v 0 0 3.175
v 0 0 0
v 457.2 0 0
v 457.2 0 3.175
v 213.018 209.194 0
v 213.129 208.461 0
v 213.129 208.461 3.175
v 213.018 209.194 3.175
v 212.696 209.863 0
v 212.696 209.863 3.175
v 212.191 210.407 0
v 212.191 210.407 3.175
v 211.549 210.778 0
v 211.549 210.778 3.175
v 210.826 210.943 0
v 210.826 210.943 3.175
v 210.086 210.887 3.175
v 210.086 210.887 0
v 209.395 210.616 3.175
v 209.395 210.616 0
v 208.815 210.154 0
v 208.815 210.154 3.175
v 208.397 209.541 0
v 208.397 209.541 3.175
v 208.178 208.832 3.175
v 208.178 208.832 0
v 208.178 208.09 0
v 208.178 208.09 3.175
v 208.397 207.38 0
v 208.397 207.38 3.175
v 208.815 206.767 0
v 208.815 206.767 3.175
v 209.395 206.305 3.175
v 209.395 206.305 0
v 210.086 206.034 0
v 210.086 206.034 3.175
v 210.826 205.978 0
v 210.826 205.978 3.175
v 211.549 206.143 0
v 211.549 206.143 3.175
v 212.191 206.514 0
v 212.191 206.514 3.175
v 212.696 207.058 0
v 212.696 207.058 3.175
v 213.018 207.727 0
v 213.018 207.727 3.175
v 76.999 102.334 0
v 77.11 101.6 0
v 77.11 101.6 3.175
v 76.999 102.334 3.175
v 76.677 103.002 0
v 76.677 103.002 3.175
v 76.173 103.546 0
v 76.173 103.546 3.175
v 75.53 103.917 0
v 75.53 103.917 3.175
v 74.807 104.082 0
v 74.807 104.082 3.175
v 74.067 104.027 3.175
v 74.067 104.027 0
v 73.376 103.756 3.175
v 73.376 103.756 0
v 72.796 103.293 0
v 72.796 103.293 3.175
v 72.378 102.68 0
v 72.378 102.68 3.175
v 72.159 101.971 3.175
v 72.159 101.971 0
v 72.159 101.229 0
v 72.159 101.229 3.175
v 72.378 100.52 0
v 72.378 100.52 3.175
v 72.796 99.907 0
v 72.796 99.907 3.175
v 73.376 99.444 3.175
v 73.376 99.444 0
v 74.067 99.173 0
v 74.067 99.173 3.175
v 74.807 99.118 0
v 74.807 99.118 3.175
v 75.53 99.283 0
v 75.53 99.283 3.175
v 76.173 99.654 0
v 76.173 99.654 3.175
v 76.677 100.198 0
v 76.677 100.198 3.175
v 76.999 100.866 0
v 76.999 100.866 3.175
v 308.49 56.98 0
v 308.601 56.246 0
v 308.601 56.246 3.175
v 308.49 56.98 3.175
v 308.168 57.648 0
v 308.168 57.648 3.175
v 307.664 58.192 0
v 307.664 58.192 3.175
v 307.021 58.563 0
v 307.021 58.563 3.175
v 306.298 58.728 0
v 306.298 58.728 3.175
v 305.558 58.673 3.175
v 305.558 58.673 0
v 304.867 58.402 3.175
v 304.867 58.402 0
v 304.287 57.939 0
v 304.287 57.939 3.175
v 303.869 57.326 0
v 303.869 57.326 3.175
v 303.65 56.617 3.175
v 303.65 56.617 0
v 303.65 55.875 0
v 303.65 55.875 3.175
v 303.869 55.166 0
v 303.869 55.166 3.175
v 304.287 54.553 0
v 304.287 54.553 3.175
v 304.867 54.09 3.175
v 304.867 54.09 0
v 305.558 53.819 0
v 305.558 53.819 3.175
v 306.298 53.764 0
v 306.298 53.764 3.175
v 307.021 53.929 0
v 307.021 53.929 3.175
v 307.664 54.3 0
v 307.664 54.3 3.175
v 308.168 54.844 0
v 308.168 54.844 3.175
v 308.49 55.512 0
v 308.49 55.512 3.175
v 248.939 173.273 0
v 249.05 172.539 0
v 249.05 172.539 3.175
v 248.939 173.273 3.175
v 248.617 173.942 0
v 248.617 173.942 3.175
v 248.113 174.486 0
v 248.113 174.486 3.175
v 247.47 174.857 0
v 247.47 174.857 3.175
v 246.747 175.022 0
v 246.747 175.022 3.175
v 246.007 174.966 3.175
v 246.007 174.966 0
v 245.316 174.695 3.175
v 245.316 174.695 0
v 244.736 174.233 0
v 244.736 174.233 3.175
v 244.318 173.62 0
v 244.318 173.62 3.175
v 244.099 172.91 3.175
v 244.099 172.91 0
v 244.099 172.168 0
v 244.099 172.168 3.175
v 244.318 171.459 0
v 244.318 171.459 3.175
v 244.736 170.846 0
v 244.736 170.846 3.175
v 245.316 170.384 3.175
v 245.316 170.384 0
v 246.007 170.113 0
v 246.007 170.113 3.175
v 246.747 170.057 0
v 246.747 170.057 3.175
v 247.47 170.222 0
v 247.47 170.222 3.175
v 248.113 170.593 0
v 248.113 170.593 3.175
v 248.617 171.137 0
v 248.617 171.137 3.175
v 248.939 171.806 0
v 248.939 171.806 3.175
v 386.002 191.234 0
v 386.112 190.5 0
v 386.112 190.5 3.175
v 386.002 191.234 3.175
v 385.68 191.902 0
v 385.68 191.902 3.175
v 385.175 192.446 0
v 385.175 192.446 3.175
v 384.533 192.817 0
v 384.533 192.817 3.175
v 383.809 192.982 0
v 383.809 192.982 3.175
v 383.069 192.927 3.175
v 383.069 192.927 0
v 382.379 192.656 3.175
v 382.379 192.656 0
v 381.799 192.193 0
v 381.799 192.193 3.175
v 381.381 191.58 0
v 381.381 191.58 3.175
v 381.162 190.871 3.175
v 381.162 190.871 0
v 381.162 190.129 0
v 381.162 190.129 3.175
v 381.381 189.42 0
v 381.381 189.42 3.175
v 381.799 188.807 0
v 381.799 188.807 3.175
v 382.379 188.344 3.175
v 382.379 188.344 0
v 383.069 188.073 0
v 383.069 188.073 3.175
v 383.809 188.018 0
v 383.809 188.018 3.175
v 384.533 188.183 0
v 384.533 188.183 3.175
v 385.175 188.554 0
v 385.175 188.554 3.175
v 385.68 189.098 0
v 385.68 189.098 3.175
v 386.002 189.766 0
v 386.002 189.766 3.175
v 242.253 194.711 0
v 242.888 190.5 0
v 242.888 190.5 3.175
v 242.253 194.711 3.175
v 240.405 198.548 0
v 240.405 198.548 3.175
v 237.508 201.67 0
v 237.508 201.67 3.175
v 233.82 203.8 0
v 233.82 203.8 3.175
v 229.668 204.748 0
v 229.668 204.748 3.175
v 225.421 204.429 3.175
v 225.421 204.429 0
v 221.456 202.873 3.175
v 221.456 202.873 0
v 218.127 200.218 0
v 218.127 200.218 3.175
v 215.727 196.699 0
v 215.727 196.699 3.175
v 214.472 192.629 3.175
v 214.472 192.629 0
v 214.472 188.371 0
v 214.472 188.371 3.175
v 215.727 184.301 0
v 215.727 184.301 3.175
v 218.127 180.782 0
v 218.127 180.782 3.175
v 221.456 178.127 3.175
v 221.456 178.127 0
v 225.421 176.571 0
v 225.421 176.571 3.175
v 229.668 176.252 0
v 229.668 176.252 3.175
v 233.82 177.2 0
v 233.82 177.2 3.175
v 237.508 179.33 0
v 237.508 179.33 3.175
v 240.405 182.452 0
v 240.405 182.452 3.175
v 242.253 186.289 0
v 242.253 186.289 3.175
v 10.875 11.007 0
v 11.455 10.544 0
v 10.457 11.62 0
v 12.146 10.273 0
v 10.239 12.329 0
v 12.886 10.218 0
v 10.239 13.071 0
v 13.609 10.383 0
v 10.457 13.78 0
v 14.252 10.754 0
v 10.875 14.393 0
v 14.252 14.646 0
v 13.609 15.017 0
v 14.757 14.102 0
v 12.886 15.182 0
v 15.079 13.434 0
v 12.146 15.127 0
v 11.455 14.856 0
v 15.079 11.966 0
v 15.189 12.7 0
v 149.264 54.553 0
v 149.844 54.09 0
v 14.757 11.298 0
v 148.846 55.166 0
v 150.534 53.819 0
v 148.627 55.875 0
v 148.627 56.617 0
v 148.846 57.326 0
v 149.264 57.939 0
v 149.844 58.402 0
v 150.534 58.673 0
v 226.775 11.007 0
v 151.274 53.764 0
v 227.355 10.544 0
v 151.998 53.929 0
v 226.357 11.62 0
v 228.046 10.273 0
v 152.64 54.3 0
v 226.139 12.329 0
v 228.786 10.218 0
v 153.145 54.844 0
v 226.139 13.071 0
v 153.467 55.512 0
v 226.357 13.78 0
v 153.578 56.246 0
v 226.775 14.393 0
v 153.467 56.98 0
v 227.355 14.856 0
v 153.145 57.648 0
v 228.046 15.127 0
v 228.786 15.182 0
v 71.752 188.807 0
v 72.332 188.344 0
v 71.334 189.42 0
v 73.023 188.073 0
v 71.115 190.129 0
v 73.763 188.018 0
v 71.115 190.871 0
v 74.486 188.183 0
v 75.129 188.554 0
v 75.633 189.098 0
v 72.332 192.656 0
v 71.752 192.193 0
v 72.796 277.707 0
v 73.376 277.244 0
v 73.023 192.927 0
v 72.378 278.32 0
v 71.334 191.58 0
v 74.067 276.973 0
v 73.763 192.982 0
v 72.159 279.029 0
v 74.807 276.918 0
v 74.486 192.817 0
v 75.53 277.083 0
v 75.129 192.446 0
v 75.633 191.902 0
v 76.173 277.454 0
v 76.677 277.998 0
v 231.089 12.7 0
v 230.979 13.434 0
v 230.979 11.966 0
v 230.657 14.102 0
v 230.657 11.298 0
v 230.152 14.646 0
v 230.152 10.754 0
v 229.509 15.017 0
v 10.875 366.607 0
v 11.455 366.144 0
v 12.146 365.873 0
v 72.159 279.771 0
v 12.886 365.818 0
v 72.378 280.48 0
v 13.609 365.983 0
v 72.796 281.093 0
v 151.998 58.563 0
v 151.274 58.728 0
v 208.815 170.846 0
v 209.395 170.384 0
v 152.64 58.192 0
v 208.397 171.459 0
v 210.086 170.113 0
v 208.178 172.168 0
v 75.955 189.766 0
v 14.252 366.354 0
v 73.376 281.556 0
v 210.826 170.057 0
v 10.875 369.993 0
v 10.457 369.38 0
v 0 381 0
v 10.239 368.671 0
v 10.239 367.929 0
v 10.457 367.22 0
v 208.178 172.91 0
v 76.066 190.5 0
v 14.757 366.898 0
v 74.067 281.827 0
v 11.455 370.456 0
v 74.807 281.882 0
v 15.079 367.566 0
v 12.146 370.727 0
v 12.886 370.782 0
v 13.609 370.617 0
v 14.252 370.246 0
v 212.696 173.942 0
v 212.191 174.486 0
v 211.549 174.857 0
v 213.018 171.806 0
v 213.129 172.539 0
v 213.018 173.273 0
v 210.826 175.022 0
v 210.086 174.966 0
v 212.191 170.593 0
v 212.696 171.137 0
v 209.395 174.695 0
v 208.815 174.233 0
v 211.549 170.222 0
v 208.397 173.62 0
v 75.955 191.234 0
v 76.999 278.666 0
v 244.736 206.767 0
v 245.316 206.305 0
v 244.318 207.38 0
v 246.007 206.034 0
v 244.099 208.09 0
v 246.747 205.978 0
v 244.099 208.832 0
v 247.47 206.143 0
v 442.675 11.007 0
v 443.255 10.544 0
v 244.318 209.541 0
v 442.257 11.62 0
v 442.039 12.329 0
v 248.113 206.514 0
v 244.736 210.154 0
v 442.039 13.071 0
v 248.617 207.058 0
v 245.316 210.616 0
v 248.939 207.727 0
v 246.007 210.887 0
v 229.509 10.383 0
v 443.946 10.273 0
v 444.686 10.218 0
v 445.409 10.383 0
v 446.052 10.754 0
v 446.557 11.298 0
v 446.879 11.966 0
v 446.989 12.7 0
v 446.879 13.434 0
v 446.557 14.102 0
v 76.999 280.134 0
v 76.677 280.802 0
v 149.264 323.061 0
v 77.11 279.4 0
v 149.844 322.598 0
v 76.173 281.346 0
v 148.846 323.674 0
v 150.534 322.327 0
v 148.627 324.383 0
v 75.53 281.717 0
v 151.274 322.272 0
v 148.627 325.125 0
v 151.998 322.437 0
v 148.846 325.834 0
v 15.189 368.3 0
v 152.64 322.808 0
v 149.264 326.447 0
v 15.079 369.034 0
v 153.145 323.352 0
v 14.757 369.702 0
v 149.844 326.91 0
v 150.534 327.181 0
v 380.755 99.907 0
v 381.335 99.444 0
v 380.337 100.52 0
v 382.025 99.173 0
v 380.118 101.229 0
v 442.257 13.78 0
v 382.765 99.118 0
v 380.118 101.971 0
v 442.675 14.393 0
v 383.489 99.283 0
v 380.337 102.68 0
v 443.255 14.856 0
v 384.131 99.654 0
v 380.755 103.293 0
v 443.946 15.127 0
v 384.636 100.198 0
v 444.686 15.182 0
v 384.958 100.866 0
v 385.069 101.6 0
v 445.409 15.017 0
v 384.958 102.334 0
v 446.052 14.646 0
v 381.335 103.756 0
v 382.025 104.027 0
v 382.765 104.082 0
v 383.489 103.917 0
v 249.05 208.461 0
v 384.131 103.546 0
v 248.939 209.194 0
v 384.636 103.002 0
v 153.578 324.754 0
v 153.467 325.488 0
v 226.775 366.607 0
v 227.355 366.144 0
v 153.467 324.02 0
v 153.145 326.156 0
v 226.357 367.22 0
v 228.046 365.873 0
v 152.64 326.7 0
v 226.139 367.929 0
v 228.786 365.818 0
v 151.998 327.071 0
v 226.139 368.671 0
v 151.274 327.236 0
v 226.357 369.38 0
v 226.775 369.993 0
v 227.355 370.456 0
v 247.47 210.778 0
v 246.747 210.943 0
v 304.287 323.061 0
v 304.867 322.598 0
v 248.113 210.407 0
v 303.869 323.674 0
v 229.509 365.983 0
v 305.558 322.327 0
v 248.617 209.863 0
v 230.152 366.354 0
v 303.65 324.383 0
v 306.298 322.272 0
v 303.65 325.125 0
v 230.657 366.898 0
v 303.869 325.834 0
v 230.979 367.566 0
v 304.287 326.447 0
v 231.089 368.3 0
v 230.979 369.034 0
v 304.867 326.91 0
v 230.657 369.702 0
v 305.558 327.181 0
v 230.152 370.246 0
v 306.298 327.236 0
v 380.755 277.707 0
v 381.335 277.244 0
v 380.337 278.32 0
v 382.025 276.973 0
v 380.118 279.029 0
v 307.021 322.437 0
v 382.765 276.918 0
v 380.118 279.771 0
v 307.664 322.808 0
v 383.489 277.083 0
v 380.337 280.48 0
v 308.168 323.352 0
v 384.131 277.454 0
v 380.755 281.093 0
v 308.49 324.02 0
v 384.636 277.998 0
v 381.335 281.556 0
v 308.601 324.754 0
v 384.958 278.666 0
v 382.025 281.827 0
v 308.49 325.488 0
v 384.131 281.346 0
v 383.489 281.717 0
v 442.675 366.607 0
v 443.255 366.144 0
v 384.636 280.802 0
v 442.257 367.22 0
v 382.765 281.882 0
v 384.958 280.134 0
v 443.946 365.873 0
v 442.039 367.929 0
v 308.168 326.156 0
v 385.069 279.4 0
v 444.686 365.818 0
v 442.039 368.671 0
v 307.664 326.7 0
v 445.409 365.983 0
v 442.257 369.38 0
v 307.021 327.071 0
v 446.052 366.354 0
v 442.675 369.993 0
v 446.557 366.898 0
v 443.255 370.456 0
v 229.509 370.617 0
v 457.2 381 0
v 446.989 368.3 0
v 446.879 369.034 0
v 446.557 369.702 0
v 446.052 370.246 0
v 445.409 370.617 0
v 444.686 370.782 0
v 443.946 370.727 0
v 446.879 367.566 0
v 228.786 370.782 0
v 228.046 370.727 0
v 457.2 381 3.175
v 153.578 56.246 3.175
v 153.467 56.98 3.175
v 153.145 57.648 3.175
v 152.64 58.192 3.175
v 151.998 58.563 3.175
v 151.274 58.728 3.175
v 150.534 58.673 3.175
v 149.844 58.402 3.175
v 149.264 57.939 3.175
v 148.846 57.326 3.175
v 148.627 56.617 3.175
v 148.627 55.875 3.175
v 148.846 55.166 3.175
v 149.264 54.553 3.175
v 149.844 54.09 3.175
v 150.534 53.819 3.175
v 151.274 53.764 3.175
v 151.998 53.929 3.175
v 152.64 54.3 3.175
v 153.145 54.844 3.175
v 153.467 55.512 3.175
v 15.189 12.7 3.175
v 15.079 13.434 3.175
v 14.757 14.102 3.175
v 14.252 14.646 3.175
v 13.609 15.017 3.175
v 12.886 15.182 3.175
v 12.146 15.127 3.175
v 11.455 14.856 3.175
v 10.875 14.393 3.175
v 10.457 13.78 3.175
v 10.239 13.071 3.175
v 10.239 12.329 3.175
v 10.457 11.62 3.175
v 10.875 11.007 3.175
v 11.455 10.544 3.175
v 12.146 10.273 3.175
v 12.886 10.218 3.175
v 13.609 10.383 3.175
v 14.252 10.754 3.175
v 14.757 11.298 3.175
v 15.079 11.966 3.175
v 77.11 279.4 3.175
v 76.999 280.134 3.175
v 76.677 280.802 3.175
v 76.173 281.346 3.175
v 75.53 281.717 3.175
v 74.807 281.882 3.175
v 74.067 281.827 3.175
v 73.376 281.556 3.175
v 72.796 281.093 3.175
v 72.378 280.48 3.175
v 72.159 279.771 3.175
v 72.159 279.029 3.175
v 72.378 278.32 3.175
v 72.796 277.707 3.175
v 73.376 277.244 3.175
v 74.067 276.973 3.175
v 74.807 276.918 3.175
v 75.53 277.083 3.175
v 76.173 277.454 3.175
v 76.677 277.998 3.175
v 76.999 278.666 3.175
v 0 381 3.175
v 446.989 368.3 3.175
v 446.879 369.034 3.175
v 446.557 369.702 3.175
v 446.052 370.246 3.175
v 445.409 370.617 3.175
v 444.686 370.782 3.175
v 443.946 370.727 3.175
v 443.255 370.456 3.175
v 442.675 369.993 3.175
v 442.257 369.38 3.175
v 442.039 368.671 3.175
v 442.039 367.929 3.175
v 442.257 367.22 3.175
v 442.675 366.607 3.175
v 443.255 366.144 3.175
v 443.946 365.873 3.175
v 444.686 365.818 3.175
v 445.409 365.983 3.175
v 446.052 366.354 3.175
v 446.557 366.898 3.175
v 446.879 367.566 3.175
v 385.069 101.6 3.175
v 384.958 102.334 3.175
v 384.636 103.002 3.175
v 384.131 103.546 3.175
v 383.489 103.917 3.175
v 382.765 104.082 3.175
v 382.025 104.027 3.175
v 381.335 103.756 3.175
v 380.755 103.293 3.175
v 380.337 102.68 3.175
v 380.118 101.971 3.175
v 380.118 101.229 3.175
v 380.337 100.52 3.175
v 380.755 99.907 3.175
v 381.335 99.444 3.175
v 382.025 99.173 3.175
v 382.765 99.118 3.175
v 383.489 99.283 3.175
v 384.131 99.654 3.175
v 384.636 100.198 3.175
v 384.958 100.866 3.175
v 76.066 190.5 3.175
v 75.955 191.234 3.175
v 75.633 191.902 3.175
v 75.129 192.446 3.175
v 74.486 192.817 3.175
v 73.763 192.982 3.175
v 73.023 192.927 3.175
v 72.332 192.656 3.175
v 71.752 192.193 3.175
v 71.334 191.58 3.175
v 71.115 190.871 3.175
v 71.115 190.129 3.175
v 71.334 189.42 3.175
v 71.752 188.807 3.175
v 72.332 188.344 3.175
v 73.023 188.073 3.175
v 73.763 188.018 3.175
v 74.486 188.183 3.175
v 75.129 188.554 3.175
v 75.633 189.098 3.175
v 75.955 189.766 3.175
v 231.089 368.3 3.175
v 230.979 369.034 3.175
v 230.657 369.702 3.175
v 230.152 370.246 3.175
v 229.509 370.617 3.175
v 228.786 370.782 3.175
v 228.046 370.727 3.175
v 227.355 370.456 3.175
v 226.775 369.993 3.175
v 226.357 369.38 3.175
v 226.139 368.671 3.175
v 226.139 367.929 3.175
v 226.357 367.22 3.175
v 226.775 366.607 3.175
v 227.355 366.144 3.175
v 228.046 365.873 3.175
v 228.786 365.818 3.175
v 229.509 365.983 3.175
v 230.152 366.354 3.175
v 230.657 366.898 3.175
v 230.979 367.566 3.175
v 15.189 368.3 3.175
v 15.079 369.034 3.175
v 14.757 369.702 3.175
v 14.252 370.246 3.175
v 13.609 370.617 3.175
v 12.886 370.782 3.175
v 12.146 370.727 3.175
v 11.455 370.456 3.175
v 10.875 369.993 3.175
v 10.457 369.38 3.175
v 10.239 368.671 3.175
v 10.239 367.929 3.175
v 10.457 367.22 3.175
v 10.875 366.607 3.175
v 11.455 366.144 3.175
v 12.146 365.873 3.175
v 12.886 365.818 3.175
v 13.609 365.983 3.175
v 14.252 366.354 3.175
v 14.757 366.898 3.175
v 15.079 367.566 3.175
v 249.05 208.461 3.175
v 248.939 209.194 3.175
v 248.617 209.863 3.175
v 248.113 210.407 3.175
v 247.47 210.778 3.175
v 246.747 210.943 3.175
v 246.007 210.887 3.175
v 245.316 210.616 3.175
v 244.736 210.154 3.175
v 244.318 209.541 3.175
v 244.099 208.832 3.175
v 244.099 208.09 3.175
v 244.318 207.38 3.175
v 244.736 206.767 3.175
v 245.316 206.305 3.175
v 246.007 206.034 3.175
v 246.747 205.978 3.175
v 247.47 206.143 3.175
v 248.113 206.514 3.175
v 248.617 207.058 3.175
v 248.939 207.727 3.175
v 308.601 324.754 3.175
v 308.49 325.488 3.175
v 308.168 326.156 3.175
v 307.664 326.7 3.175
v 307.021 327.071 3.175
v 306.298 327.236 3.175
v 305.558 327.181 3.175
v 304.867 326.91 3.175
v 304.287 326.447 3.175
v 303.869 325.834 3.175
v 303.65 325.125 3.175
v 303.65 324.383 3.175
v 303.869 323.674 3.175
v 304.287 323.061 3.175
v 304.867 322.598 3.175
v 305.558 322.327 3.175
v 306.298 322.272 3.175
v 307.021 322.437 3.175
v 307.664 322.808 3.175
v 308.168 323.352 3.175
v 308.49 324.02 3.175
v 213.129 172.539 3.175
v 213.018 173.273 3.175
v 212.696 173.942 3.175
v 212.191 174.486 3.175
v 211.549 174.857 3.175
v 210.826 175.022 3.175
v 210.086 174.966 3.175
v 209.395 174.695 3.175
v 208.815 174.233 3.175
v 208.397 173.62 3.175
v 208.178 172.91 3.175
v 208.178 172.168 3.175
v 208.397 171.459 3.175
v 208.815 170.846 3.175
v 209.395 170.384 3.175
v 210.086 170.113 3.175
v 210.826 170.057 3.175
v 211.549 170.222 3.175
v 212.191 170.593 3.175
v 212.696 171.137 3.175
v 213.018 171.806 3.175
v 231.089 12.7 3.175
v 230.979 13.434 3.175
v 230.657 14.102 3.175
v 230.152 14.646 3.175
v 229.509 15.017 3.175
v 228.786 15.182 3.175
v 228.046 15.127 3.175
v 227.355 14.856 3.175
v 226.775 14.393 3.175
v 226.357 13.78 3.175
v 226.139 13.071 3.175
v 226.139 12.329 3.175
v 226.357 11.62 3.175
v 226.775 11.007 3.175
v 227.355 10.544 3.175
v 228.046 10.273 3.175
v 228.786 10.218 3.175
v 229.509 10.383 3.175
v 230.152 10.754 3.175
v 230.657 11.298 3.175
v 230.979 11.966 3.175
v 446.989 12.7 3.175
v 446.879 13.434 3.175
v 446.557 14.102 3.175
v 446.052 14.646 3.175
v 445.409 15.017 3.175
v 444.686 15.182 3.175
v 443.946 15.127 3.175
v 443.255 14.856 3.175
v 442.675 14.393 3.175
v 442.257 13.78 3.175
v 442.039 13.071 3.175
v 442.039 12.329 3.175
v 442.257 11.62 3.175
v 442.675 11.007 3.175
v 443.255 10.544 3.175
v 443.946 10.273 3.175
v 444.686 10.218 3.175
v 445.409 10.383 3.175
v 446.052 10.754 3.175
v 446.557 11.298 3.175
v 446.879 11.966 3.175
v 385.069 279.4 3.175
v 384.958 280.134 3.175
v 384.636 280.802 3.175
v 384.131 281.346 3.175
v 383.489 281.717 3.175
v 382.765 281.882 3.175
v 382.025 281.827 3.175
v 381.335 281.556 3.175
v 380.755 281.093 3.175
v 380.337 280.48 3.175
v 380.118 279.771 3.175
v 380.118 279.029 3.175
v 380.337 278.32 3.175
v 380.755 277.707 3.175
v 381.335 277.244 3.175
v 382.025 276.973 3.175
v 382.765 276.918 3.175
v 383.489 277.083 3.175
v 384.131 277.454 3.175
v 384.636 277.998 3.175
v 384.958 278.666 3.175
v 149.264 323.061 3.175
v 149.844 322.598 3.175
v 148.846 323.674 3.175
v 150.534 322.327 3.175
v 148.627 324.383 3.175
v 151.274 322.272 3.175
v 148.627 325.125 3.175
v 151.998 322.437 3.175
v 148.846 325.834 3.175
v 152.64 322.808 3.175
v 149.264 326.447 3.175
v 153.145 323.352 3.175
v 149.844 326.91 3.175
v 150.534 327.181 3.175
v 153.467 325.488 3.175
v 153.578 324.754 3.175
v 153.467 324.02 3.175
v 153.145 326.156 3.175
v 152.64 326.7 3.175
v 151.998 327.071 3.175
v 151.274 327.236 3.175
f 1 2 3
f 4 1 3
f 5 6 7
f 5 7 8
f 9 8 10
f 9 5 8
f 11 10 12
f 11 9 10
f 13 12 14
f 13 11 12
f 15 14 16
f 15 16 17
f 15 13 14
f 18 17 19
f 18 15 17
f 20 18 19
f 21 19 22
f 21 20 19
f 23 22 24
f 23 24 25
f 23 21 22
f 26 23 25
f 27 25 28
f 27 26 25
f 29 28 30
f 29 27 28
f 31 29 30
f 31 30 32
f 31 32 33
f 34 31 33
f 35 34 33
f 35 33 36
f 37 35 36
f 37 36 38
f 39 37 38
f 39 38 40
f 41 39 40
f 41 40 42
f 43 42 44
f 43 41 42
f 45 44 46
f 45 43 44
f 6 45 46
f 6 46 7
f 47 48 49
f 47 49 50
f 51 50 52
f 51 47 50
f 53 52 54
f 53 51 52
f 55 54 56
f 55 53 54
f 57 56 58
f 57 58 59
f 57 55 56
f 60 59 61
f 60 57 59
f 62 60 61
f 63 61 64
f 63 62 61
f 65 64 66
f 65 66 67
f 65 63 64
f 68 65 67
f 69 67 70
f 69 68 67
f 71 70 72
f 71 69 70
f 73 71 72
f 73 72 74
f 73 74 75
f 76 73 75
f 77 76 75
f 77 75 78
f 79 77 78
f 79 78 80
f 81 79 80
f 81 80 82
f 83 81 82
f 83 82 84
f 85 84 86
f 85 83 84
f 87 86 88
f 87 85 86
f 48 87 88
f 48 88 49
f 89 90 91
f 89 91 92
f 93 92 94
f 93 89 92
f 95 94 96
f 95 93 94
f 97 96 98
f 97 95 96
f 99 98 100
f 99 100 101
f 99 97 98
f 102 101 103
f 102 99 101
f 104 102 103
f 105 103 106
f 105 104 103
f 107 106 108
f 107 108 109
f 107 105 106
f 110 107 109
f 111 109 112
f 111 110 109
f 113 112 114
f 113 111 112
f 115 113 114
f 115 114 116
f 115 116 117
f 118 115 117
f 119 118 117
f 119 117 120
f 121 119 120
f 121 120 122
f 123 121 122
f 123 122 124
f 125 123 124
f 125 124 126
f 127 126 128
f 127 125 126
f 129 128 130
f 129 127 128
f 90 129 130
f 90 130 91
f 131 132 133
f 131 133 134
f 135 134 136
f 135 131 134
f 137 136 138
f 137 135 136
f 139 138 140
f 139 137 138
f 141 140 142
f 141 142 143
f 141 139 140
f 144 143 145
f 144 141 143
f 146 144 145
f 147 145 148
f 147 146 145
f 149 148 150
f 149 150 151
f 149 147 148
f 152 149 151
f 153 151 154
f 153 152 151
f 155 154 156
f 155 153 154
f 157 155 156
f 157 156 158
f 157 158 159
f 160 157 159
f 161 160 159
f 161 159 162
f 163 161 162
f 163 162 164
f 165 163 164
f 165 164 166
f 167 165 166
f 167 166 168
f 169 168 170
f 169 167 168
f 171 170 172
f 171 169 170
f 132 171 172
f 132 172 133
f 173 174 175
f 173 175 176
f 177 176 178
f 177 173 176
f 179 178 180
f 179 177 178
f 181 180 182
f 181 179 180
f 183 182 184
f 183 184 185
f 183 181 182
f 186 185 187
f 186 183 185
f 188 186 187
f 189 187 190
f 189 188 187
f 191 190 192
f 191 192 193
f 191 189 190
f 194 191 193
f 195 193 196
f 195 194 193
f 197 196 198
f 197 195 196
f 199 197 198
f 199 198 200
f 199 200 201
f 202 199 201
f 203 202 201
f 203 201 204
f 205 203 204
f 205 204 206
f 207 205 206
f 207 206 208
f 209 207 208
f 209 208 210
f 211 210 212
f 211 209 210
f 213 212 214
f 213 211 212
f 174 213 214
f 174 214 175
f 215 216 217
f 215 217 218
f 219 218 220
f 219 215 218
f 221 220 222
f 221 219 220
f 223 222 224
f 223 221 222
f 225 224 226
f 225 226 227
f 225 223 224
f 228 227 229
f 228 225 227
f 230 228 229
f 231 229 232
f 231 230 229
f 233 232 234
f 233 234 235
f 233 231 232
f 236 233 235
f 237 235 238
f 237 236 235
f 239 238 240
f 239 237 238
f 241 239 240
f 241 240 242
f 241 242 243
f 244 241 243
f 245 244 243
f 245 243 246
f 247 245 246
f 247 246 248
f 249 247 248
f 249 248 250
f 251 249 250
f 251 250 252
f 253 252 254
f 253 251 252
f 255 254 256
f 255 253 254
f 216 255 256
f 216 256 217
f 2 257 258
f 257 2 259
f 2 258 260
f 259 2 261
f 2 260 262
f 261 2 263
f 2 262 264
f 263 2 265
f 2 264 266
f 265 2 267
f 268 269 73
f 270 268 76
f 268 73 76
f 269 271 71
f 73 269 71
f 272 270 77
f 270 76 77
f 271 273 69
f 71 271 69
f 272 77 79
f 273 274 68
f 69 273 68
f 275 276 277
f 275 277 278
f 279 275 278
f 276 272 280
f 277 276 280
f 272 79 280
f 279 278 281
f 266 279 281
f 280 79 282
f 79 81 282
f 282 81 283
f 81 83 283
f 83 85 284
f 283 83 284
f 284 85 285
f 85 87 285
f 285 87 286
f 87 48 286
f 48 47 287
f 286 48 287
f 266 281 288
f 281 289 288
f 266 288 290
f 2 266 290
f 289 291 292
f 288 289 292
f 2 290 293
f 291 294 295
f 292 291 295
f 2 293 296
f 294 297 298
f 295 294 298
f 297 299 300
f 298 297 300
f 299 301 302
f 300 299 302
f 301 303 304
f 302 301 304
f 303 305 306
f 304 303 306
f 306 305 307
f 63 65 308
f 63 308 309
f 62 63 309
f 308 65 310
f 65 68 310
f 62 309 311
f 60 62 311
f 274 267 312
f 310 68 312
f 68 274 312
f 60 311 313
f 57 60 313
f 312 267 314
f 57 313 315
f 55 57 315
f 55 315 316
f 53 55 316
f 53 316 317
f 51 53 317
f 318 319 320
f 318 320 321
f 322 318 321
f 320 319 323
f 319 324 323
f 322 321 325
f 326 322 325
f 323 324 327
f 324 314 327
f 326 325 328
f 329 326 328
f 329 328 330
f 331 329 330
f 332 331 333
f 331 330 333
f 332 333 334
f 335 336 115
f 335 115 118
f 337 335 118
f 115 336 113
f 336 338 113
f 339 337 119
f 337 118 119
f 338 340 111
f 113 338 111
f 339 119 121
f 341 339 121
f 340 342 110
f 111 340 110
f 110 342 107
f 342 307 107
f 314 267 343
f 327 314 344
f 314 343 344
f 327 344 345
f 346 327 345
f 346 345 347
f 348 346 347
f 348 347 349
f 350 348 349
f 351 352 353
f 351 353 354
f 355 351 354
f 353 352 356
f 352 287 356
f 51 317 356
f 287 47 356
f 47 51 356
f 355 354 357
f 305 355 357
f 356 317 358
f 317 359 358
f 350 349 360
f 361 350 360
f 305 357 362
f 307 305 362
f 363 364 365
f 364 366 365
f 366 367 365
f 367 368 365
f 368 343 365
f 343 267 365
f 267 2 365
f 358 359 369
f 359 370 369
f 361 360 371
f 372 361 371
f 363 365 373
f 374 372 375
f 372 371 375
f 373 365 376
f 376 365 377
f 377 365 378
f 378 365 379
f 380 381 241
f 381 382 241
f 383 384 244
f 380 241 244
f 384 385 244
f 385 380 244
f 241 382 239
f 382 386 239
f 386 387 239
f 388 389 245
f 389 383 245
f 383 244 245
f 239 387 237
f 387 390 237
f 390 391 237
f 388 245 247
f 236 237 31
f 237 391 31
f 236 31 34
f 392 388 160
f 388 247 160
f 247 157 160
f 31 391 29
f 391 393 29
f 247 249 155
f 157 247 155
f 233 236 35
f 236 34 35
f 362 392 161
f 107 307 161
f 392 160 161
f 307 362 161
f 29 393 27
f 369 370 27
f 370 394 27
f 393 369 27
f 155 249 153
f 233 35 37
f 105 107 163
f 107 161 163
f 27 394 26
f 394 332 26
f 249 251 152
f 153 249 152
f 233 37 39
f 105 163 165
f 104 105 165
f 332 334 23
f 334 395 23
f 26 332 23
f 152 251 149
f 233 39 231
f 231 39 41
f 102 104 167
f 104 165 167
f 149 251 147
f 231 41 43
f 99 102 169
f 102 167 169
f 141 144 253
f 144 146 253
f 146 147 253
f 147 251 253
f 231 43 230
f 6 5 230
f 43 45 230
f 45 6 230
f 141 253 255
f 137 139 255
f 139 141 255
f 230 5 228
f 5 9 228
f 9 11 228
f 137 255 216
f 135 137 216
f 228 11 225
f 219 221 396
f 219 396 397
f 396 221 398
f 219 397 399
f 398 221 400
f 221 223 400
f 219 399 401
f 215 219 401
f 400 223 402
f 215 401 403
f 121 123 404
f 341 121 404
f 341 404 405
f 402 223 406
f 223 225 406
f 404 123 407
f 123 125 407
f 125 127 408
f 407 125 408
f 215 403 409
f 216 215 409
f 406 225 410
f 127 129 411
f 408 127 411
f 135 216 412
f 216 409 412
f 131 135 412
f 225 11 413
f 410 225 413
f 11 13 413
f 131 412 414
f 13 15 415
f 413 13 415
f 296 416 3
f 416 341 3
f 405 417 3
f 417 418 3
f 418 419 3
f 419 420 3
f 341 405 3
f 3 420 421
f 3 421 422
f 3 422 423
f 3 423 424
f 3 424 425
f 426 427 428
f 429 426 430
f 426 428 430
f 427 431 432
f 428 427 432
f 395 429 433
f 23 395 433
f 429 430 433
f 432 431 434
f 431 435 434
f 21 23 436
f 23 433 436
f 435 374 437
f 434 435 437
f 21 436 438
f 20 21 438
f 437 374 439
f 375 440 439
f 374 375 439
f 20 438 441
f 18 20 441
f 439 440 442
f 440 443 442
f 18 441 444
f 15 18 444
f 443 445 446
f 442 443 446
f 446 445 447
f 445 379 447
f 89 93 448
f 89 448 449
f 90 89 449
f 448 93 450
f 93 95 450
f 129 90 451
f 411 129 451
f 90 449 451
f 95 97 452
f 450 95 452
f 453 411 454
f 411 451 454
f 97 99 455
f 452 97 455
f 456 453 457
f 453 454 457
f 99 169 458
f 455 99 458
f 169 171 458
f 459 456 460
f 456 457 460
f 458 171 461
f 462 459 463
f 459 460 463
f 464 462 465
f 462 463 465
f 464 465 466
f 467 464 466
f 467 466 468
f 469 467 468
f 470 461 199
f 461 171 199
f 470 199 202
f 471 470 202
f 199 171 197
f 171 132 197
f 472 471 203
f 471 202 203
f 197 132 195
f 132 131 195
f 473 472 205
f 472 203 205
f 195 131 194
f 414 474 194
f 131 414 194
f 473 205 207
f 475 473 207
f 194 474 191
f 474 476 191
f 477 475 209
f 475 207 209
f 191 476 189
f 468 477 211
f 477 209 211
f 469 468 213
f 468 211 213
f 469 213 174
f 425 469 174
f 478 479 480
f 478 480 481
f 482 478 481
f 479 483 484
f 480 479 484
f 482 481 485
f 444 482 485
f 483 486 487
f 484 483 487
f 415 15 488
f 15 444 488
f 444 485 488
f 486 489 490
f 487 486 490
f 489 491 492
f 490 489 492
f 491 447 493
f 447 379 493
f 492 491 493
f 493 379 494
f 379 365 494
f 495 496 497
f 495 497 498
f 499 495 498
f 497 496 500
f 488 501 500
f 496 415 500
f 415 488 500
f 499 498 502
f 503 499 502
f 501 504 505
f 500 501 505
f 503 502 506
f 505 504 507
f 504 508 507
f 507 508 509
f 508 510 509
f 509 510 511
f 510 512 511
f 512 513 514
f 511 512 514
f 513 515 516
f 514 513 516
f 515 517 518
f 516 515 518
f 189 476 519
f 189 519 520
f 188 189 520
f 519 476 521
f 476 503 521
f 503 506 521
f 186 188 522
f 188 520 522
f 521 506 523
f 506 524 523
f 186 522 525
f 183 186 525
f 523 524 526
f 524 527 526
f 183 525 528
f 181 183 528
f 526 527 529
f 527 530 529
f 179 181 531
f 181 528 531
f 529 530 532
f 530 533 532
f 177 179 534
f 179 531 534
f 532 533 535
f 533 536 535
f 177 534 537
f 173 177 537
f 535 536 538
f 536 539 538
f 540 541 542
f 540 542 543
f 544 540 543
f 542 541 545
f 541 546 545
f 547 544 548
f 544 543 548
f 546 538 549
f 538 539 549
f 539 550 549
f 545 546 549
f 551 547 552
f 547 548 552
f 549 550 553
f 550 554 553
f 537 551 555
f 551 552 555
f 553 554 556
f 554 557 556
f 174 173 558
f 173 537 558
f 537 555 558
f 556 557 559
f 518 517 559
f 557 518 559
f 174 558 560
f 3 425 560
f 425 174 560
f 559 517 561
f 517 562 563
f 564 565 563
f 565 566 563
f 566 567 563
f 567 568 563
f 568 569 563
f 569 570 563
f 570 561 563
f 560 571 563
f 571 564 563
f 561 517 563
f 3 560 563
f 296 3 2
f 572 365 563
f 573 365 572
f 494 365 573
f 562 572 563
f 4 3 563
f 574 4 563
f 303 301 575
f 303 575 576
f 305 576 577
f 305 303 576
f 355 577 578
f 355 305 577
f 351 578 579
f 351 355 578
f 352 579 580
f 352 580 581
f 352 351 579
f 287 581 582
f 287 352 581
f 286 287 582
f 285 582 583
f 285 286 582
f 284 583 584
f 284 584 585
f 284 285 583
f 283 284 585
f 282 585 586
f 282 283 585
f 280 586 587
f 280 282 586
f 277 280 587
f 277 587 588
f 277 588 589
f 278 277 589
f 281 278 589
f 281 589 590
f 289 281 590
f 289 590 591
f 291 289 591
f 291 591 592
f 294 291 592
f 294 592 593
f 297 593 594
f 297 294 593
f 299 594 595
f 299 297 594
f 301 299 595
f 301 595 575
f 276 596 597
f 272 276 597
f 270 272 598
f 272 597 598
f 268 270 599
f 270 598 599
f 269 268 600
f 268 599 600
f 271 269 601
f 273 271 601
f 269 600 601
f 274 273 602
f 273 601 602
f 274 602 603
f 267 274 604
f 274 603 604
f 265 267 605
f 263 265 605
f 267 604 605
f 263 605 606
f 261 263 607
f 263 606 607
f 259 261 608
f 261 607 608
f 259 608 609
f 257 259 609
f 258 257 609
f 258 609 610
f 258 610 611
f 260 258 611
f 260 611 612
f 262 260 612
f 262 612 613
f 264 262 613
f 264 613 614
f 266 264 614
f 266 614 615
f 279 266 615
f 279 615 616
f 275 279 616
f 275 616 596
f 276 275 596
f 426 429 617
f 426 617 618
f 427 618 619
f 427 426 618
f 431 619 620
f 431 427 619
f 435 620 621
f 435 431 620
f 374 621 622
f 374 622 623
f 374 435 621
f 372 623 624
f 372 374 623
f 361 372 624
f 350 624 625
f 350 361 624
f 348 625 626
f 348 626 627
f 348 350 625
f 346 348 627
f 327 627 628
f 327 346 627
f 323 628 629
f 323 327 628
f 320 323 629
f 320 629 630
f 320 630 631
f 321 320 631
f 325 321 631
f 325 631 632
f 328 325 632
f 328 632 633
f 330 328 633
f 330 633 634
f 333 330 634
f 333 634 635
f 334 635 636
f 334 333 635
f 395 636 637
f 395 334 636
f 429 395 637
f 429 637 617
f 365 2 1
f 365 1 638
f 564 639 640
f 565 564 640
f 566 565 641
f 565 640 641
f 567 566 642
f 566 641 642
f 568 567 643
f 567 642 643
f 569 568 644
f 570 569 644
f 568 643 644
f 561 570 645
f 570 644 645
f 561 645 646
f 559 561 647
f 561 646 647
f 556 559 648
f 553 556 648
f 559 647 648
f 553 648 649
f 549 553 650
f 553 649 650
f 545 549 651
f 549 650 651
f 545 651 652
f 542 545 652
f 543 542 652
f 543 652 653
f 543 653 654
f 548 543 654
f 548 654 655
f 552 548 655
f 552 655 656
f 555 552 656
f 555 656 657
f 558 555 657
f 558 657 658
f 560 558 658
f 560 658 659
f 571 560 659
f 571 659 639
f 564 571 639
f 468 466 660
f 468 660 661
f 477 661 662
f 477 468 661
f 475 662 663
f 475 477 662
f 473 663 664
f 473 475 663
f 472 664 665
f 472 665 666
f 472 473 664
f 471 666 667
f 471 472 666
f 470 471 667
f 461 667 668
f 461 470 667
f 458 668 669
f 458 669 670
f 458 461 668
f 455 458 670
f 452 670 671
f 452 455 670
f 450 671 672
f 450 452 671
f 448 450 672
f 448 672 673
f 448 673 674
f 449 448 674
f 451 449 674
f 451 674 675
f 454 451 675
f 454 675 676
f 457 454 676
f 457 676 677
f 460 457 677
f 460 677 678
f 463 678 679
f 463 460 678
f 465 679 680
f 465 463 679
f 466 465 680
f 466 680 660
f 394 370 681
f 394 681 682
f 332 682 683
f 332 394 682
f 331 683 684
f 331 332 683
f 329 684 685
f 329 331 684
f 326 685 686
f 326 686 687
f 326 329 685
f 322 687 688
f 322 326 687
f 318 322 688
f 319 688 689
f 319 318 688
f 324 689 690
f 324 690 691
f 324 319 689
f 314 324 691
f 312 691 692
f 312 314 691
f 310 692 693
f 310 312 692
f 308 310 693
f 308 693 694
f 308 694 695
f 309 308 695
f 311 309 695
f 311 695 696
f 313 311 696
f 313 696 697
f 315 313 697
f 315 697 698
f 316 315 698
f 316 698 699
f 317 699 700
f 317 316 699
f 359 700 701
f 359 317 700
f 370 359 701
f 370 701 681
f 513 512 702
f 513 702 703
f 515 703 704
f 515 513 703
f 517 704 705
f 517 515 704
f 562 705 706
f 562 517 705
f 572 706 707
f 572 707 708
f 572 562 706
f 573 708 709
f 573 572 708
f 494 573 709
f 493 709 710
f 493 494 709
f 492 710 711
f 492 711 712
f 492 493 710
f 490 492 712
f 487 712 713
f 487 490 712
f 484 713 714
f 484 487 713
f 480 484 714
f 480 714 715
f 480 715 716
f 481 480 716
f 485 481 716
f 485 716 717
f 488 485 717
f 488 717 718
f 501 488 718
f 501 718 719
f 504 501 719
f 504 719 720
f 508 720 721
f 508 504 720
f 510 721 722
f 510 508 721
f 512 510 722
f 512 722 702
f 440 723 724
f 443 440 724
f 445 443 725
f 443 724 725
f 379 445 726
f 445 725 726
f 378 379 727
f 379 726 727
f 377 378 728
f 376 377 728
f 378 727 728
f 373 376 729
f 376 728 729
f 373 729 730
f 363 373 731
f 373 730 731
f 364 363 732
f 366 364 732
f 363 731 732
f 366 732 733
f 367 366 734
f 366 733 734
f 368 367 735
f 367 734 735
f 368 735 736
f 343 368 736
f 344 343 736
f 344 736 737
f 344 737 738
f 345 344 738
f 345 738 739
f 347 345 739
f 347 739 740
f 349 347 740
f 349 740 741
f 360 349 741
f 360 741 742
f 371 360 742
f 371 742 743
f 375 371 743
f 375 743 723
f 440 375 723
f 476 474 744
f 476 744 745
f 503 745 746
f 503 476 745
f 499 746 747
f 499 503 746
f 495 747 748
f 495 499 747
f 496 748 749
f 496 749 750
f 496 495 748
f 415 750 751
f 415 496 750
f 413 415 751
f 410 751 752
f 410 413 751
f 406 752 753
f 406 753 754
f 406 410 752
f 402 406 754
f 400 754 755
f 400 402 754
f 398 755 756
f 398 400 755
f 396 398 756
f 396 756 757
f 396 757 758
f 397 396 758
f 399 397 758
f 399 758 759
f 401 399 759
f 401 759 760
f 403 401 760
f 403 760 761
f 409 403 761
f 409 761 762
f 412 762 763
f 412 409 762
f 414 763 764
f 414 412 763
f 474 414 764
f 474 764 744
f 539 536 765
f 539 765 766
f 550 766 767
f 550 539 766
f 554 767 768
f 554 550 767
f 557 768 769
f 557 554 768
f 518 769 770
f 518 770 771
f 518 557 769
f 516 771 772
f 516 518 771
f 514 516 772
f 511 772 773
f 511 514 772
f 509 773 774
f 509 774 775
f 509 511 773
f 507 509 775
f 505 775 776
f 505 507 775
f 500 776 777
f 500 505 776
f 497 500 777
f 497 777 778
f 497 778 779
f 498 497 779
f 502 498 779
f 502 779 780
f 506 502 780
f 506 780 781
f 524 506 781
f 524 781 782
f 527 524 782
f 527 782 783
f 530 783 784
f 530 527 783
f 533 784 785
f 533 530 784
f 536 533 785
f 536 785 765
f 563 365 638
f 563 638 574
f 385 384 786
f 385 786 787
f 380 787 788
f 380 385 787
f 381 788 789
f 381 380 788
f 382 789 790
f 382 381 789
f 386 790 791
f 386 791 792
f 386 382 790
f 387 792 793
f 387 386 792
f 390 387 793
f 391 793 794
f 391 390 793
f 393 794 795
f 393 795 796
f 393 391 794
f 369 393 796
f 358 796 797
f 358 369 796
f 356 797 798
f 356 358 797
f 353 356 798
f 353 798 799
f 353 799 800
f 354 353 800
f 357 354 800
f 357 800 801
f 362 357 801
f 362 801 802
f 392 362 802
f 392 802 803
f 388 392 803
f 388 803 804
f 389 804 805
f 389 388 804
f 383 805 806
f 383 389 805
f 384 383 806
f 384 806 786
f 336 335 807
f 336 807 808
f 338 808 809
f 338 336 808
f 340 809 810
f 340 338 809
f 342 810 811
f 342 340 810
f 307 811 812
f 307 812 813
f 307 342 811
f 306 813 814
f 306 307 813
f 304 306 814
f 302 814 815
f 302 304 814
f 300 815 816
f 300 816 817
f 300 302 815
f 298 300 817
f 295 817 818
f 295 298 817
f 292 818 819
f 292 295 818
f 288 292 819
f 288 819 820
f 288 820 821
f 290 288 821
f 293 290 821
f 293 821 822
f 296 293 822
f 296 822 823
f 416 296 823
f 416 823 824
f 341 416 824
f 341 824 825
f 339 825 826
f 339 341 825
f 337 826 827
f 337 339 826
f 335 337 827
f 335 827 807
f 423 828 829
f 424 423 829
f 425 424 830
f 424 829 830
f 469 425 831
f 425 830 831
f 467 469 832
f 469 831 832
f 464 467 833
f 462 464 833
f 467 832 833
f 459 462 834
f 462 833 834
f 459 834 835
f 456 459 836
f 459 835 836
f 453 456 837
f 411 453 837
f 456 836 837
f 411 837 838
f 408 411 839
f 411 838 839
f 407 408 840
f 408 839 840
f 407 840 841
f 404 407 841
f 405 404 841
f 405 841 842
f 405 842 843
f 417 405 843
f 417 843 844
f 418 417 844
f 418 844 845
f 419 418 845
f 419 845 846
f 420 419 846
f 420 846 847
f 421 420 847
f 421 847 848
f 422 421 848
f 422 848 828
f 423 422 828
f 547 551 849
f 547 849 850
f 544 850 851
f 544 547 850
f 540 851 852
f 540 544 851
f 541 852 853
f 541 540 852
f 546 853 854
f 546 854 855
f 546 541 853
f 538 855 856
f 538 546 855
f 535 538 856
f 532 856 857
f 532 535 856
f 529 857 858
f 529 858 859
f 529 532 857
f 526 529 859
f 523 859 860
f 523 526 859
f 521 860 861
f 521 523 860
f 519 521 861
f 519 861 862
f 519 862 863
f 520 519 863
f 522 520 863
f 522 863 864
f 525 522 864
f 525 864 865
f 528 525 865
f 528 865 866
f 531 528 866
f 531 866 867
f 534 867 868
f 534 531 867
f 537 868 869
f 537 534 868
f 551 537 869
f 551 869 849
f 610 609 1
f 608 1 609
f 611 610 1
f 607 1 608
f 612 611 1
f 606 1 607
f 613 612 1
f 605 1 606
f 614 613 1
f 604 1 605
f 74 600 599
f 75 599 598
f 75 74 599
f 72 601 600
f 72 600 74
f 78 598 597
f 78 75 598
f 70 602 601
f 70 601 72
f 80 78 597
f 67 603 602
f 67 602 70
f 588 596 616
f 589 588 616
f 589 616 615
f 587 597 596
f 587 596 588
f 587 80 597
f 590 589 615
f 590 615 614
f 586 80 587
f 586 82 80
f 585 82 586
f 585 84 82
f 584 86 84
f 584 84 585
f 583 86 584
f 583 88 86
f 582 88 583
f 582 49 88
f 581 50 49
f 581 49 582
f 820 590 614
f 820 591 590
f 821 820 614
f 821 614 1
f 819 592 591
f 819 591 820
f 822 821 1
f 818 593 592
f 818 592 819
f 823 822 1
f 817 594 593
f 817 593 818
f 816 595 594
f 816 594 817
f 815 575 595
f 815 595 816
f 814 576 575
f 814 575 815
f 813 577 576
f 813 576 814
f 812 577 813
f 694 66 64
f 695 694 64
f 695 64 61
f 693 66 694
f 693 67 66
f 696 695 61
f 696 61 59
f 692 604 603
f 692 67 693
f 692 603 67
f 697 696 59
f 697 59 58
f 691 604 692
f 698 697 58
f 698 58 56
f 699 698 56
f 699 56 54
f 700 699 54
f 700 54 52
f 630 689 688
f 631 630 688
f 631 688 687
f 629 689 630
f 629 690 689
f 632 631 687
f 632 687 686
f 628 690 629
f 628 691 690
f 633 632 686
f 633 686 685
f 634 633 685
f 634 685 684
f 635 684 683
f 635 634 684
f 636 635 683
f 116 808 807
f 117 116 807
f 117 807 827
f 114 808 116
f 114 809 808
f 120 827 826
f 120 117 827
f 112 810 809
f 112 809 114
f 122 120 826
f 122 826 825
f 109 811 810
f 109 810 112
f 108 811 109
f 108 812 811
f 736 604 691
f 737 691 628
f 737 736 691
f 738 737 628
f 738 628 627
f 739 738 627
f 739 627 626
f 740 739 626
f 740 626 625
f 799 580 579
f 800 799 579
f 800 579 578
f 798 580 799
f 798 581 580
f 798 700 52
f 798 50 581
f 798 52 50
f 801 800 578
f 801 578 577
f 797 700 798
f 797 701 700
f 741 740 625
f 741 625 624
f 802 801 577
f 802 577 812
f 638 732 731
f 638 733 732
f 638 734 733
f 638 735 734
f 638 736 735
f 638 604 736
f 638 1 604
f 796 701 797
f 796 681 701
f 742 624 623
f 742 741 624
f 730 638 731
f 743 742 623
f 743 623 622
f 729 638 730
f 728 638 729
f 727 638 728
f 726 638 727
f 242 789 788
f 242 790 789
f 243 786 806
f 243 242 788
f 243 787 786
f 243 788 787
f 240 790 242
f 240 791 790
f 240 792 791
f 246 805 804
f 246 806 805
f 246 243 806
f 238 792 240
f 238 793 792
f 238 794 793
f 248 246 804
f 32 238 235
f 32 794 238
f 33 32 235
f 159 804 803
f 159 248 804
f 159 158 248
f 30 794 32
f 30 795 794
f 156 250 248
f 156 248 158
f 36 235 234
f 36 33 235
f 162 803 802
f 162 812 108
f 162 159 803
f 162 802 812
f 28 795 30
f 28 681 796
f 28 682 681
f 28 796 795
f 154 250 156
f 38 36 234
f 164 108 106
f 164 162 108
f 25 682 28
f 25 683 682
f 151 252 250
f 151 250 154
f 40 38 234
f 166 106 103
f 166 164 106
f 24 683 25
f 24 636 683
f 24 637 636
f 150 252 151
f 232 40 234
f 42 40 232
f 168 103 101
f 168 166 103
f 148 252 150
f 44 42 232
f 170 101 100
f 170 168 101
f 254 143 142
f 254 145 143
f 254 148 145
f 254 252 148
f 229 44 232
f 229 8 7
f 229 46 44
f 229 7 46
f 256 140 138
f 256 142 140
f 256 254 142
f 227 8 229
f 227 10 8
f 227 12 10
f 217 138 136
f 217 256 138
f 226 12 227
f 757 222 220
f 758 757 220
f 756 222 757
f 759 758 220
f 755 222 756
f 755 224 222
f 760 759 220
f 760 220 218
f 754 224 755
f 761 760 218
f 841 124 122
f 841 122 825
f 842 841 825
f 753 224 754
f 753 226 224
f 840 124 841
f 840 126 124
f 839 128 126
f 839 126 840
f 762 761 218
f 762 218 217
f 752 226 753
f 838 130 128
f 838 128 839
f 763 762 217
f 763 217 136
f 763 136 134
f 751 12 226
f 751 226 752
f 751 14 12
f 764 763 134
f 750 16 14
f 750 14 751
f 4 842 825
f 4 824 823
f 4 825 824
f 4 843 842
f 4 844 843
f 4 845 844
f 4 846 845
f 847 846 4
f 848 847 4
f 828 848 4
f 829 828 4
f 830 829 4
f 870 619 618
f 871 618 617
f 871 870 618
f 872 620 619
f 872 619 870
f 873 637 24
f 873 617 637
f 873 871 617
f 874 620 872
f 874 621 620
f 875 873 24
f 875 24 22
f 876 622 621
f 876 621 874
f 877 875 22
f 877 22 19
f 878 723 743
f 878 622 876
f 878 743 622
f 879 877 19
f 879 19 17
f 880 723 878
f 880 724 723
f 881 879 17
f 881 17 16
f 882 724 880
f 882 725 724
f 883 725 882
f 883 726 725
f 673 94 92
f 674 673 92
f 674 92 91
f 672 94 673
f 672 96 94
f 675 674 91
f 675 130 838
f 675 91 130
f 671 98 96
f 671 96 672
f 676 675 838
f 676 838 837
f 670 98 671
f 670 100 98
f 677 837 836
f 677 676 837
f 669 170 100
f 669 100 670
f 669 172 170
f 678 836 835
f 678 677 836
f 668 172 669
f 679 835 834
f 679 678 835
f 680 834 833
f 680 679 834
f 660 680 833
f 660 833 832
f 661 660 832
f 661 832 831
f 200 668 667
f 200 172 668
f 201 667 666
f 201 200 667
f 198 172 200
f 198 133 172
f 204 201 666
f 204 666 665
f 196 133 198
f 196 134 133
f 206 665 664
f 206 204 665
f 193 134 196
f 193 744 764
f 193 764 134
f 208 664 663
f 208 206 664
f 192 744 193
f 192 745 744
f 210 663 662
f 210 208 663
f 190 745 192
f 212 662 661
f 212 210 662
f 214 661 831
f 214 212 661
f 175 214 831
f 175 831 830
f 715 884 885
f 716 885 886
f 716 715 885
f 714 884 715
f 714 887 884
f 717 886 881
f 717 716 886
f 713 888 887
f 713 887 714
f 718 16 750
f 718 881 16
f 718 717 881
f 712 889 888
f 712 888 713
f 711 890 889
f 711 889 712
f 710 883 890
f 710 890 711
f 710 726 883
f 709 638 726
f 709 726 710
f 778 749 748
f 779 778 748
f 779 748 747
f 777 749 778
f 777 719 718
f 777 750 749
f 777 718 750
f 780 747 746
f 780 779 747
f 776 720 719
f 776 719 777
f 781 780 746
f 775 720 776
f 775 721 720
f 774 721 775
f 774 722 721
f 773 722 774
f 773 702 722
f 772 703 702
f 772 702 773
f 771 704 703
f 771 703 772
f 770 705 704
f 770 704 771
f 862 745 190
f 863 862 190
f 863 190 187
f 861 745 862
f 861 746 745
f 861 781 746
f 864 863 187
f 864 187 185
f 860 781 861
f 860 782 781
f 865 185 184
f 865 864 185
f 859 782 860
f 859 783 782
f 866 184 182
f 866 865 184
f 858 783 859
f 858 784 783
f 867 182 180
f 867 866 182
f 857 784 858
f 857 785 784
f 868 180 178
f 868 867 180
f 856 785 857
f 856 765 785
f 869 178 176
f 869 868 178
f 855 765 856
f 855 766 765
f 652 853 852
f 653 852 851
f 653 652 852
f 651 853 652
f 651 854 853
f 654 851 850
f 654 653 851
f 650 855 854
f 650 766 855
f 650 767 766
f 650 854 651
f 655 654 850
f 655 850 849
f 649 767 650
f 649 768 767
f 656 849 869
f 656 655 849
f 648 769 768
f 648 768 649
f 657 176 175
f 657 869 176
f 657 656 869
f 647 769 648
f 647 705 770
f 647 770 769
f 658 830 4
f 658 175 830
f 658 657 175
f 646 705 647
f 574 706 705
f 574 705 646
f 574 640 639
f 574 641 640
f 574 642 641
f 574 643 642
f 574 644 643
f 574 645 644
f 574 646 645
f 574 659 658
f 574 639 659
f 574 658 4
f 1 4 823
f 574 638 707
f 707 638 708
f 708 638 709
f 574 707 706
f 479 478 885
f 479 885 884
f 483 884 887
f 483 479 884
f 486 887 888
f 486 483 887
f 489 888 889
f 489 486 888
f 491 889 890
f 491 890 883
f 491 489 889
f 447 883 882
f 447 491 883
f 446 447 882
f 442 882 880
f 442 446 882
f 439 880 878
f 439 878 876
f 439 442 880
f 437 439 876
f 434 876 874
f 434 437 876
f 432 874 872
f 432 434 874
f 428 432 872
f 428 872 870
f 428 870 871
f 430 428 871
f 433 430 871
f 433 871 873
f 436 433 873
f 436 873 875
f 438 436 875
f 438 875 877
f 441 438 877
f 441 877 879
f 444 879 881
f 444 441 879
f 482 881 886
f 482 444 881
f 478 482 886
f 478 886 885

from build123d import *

# Parameters (mm, degrees)
F0_W     = 457.2
F0_H     = 381
F0_R     = 2.4892
F0_R_2   = 14.2875
F1_DEPTH = 3.175
F2_R     = 2.4892
F3_DEPTH = 3.176


with BuildPart() as f1:
    # F0 (on Top) → F1 (new body)
    with BuildSketch(Plane.XY):
        with Locations((228.6, 190.5)):
            Rectangle(F0_W, F0_H)
        with Locations((151.088372, 56.245922)):
            Circle(F0_R, mode=Mode.SUBTRACT)
        with Locations((74.620683, 101.6)):
            Circle(F0_R, mode=Mode.SUBTRACT)
        with Locations((210.639488, 172.539488)):
            Circle(F0_R, mode=Mode.SUBTRACT)
        with Locations((228.6, 12.7)):
            Circle(F0_R, mode=Mode.SUBTRACT)
        with Locations((306.111628, 56.245922)):
            Circle(F0_R, mode=Mode.SUBTRACT)
        with Locations((246.560512, 172.539488)):
            Circle(F0_R, mode=Mode.SUBTRACT)
        with Locations((382.579317, 101.6)):
            Circle(F0_R, mode=Mode.SUBTRACT)
        with Locations((73.576744, 190.5)):
            Circle(F0_R, mode=Mode.SUBTRACT)
        with Locations((74.620683, 279.4)):
            Circle(F0_R, mode=Mode.SUBTRACT)
        with Locations((210.639488, 208.460512)):
            Circle(F0_R, mode=Mode.SUBTRACT)
        with Locations((151.088372, 324.754078)):
            Circle(F0_R, mode=Mode.SUBTRACT)
        with Locations((228.6, 190.5)):
            Circle(F0_R_2, mode=Mode.SUBTRACT)
        with Locations((246.560512, 208.460512)):
            Circle(F0_R, mode=Mode.SUBTRACT)
        with Locations((383.623256, 190.5)):
            Circle(F0_R, mode=Mode.SUBTRACT)
        with Locations((382.579317, 279.4)):
            Circle(F0_R, mode=Mode.SUBTRACT)
        with Locations((306.111628, 324.754078)):
            Circle(F0_R, mode=Mode.SUBTRACT)
        with Locations((228.6, 368.3)):
            Circle(F0_R, mode=Mode.SUBTRACT)
    extrude(amount=F1_DEPTH)

    # F2 (on face) → F3 (cut, through all)
    with BuildSketch(Plane.XY.offset(3.175)):
        with Locations((12.7, 368.3)):
            Circle(F2_R)
        with Locations((444.5, 368.3)):
            Circle(F2_R)
        with Locations((444.5, 12.7)):
            Circle(F2_R)
        with Locations((12.7, 12.7)):
            Circle(F2_R)
    extrude(amount=-F3_DEPTH, mode=Mode.SUBTRACT)


solid = f1.part
